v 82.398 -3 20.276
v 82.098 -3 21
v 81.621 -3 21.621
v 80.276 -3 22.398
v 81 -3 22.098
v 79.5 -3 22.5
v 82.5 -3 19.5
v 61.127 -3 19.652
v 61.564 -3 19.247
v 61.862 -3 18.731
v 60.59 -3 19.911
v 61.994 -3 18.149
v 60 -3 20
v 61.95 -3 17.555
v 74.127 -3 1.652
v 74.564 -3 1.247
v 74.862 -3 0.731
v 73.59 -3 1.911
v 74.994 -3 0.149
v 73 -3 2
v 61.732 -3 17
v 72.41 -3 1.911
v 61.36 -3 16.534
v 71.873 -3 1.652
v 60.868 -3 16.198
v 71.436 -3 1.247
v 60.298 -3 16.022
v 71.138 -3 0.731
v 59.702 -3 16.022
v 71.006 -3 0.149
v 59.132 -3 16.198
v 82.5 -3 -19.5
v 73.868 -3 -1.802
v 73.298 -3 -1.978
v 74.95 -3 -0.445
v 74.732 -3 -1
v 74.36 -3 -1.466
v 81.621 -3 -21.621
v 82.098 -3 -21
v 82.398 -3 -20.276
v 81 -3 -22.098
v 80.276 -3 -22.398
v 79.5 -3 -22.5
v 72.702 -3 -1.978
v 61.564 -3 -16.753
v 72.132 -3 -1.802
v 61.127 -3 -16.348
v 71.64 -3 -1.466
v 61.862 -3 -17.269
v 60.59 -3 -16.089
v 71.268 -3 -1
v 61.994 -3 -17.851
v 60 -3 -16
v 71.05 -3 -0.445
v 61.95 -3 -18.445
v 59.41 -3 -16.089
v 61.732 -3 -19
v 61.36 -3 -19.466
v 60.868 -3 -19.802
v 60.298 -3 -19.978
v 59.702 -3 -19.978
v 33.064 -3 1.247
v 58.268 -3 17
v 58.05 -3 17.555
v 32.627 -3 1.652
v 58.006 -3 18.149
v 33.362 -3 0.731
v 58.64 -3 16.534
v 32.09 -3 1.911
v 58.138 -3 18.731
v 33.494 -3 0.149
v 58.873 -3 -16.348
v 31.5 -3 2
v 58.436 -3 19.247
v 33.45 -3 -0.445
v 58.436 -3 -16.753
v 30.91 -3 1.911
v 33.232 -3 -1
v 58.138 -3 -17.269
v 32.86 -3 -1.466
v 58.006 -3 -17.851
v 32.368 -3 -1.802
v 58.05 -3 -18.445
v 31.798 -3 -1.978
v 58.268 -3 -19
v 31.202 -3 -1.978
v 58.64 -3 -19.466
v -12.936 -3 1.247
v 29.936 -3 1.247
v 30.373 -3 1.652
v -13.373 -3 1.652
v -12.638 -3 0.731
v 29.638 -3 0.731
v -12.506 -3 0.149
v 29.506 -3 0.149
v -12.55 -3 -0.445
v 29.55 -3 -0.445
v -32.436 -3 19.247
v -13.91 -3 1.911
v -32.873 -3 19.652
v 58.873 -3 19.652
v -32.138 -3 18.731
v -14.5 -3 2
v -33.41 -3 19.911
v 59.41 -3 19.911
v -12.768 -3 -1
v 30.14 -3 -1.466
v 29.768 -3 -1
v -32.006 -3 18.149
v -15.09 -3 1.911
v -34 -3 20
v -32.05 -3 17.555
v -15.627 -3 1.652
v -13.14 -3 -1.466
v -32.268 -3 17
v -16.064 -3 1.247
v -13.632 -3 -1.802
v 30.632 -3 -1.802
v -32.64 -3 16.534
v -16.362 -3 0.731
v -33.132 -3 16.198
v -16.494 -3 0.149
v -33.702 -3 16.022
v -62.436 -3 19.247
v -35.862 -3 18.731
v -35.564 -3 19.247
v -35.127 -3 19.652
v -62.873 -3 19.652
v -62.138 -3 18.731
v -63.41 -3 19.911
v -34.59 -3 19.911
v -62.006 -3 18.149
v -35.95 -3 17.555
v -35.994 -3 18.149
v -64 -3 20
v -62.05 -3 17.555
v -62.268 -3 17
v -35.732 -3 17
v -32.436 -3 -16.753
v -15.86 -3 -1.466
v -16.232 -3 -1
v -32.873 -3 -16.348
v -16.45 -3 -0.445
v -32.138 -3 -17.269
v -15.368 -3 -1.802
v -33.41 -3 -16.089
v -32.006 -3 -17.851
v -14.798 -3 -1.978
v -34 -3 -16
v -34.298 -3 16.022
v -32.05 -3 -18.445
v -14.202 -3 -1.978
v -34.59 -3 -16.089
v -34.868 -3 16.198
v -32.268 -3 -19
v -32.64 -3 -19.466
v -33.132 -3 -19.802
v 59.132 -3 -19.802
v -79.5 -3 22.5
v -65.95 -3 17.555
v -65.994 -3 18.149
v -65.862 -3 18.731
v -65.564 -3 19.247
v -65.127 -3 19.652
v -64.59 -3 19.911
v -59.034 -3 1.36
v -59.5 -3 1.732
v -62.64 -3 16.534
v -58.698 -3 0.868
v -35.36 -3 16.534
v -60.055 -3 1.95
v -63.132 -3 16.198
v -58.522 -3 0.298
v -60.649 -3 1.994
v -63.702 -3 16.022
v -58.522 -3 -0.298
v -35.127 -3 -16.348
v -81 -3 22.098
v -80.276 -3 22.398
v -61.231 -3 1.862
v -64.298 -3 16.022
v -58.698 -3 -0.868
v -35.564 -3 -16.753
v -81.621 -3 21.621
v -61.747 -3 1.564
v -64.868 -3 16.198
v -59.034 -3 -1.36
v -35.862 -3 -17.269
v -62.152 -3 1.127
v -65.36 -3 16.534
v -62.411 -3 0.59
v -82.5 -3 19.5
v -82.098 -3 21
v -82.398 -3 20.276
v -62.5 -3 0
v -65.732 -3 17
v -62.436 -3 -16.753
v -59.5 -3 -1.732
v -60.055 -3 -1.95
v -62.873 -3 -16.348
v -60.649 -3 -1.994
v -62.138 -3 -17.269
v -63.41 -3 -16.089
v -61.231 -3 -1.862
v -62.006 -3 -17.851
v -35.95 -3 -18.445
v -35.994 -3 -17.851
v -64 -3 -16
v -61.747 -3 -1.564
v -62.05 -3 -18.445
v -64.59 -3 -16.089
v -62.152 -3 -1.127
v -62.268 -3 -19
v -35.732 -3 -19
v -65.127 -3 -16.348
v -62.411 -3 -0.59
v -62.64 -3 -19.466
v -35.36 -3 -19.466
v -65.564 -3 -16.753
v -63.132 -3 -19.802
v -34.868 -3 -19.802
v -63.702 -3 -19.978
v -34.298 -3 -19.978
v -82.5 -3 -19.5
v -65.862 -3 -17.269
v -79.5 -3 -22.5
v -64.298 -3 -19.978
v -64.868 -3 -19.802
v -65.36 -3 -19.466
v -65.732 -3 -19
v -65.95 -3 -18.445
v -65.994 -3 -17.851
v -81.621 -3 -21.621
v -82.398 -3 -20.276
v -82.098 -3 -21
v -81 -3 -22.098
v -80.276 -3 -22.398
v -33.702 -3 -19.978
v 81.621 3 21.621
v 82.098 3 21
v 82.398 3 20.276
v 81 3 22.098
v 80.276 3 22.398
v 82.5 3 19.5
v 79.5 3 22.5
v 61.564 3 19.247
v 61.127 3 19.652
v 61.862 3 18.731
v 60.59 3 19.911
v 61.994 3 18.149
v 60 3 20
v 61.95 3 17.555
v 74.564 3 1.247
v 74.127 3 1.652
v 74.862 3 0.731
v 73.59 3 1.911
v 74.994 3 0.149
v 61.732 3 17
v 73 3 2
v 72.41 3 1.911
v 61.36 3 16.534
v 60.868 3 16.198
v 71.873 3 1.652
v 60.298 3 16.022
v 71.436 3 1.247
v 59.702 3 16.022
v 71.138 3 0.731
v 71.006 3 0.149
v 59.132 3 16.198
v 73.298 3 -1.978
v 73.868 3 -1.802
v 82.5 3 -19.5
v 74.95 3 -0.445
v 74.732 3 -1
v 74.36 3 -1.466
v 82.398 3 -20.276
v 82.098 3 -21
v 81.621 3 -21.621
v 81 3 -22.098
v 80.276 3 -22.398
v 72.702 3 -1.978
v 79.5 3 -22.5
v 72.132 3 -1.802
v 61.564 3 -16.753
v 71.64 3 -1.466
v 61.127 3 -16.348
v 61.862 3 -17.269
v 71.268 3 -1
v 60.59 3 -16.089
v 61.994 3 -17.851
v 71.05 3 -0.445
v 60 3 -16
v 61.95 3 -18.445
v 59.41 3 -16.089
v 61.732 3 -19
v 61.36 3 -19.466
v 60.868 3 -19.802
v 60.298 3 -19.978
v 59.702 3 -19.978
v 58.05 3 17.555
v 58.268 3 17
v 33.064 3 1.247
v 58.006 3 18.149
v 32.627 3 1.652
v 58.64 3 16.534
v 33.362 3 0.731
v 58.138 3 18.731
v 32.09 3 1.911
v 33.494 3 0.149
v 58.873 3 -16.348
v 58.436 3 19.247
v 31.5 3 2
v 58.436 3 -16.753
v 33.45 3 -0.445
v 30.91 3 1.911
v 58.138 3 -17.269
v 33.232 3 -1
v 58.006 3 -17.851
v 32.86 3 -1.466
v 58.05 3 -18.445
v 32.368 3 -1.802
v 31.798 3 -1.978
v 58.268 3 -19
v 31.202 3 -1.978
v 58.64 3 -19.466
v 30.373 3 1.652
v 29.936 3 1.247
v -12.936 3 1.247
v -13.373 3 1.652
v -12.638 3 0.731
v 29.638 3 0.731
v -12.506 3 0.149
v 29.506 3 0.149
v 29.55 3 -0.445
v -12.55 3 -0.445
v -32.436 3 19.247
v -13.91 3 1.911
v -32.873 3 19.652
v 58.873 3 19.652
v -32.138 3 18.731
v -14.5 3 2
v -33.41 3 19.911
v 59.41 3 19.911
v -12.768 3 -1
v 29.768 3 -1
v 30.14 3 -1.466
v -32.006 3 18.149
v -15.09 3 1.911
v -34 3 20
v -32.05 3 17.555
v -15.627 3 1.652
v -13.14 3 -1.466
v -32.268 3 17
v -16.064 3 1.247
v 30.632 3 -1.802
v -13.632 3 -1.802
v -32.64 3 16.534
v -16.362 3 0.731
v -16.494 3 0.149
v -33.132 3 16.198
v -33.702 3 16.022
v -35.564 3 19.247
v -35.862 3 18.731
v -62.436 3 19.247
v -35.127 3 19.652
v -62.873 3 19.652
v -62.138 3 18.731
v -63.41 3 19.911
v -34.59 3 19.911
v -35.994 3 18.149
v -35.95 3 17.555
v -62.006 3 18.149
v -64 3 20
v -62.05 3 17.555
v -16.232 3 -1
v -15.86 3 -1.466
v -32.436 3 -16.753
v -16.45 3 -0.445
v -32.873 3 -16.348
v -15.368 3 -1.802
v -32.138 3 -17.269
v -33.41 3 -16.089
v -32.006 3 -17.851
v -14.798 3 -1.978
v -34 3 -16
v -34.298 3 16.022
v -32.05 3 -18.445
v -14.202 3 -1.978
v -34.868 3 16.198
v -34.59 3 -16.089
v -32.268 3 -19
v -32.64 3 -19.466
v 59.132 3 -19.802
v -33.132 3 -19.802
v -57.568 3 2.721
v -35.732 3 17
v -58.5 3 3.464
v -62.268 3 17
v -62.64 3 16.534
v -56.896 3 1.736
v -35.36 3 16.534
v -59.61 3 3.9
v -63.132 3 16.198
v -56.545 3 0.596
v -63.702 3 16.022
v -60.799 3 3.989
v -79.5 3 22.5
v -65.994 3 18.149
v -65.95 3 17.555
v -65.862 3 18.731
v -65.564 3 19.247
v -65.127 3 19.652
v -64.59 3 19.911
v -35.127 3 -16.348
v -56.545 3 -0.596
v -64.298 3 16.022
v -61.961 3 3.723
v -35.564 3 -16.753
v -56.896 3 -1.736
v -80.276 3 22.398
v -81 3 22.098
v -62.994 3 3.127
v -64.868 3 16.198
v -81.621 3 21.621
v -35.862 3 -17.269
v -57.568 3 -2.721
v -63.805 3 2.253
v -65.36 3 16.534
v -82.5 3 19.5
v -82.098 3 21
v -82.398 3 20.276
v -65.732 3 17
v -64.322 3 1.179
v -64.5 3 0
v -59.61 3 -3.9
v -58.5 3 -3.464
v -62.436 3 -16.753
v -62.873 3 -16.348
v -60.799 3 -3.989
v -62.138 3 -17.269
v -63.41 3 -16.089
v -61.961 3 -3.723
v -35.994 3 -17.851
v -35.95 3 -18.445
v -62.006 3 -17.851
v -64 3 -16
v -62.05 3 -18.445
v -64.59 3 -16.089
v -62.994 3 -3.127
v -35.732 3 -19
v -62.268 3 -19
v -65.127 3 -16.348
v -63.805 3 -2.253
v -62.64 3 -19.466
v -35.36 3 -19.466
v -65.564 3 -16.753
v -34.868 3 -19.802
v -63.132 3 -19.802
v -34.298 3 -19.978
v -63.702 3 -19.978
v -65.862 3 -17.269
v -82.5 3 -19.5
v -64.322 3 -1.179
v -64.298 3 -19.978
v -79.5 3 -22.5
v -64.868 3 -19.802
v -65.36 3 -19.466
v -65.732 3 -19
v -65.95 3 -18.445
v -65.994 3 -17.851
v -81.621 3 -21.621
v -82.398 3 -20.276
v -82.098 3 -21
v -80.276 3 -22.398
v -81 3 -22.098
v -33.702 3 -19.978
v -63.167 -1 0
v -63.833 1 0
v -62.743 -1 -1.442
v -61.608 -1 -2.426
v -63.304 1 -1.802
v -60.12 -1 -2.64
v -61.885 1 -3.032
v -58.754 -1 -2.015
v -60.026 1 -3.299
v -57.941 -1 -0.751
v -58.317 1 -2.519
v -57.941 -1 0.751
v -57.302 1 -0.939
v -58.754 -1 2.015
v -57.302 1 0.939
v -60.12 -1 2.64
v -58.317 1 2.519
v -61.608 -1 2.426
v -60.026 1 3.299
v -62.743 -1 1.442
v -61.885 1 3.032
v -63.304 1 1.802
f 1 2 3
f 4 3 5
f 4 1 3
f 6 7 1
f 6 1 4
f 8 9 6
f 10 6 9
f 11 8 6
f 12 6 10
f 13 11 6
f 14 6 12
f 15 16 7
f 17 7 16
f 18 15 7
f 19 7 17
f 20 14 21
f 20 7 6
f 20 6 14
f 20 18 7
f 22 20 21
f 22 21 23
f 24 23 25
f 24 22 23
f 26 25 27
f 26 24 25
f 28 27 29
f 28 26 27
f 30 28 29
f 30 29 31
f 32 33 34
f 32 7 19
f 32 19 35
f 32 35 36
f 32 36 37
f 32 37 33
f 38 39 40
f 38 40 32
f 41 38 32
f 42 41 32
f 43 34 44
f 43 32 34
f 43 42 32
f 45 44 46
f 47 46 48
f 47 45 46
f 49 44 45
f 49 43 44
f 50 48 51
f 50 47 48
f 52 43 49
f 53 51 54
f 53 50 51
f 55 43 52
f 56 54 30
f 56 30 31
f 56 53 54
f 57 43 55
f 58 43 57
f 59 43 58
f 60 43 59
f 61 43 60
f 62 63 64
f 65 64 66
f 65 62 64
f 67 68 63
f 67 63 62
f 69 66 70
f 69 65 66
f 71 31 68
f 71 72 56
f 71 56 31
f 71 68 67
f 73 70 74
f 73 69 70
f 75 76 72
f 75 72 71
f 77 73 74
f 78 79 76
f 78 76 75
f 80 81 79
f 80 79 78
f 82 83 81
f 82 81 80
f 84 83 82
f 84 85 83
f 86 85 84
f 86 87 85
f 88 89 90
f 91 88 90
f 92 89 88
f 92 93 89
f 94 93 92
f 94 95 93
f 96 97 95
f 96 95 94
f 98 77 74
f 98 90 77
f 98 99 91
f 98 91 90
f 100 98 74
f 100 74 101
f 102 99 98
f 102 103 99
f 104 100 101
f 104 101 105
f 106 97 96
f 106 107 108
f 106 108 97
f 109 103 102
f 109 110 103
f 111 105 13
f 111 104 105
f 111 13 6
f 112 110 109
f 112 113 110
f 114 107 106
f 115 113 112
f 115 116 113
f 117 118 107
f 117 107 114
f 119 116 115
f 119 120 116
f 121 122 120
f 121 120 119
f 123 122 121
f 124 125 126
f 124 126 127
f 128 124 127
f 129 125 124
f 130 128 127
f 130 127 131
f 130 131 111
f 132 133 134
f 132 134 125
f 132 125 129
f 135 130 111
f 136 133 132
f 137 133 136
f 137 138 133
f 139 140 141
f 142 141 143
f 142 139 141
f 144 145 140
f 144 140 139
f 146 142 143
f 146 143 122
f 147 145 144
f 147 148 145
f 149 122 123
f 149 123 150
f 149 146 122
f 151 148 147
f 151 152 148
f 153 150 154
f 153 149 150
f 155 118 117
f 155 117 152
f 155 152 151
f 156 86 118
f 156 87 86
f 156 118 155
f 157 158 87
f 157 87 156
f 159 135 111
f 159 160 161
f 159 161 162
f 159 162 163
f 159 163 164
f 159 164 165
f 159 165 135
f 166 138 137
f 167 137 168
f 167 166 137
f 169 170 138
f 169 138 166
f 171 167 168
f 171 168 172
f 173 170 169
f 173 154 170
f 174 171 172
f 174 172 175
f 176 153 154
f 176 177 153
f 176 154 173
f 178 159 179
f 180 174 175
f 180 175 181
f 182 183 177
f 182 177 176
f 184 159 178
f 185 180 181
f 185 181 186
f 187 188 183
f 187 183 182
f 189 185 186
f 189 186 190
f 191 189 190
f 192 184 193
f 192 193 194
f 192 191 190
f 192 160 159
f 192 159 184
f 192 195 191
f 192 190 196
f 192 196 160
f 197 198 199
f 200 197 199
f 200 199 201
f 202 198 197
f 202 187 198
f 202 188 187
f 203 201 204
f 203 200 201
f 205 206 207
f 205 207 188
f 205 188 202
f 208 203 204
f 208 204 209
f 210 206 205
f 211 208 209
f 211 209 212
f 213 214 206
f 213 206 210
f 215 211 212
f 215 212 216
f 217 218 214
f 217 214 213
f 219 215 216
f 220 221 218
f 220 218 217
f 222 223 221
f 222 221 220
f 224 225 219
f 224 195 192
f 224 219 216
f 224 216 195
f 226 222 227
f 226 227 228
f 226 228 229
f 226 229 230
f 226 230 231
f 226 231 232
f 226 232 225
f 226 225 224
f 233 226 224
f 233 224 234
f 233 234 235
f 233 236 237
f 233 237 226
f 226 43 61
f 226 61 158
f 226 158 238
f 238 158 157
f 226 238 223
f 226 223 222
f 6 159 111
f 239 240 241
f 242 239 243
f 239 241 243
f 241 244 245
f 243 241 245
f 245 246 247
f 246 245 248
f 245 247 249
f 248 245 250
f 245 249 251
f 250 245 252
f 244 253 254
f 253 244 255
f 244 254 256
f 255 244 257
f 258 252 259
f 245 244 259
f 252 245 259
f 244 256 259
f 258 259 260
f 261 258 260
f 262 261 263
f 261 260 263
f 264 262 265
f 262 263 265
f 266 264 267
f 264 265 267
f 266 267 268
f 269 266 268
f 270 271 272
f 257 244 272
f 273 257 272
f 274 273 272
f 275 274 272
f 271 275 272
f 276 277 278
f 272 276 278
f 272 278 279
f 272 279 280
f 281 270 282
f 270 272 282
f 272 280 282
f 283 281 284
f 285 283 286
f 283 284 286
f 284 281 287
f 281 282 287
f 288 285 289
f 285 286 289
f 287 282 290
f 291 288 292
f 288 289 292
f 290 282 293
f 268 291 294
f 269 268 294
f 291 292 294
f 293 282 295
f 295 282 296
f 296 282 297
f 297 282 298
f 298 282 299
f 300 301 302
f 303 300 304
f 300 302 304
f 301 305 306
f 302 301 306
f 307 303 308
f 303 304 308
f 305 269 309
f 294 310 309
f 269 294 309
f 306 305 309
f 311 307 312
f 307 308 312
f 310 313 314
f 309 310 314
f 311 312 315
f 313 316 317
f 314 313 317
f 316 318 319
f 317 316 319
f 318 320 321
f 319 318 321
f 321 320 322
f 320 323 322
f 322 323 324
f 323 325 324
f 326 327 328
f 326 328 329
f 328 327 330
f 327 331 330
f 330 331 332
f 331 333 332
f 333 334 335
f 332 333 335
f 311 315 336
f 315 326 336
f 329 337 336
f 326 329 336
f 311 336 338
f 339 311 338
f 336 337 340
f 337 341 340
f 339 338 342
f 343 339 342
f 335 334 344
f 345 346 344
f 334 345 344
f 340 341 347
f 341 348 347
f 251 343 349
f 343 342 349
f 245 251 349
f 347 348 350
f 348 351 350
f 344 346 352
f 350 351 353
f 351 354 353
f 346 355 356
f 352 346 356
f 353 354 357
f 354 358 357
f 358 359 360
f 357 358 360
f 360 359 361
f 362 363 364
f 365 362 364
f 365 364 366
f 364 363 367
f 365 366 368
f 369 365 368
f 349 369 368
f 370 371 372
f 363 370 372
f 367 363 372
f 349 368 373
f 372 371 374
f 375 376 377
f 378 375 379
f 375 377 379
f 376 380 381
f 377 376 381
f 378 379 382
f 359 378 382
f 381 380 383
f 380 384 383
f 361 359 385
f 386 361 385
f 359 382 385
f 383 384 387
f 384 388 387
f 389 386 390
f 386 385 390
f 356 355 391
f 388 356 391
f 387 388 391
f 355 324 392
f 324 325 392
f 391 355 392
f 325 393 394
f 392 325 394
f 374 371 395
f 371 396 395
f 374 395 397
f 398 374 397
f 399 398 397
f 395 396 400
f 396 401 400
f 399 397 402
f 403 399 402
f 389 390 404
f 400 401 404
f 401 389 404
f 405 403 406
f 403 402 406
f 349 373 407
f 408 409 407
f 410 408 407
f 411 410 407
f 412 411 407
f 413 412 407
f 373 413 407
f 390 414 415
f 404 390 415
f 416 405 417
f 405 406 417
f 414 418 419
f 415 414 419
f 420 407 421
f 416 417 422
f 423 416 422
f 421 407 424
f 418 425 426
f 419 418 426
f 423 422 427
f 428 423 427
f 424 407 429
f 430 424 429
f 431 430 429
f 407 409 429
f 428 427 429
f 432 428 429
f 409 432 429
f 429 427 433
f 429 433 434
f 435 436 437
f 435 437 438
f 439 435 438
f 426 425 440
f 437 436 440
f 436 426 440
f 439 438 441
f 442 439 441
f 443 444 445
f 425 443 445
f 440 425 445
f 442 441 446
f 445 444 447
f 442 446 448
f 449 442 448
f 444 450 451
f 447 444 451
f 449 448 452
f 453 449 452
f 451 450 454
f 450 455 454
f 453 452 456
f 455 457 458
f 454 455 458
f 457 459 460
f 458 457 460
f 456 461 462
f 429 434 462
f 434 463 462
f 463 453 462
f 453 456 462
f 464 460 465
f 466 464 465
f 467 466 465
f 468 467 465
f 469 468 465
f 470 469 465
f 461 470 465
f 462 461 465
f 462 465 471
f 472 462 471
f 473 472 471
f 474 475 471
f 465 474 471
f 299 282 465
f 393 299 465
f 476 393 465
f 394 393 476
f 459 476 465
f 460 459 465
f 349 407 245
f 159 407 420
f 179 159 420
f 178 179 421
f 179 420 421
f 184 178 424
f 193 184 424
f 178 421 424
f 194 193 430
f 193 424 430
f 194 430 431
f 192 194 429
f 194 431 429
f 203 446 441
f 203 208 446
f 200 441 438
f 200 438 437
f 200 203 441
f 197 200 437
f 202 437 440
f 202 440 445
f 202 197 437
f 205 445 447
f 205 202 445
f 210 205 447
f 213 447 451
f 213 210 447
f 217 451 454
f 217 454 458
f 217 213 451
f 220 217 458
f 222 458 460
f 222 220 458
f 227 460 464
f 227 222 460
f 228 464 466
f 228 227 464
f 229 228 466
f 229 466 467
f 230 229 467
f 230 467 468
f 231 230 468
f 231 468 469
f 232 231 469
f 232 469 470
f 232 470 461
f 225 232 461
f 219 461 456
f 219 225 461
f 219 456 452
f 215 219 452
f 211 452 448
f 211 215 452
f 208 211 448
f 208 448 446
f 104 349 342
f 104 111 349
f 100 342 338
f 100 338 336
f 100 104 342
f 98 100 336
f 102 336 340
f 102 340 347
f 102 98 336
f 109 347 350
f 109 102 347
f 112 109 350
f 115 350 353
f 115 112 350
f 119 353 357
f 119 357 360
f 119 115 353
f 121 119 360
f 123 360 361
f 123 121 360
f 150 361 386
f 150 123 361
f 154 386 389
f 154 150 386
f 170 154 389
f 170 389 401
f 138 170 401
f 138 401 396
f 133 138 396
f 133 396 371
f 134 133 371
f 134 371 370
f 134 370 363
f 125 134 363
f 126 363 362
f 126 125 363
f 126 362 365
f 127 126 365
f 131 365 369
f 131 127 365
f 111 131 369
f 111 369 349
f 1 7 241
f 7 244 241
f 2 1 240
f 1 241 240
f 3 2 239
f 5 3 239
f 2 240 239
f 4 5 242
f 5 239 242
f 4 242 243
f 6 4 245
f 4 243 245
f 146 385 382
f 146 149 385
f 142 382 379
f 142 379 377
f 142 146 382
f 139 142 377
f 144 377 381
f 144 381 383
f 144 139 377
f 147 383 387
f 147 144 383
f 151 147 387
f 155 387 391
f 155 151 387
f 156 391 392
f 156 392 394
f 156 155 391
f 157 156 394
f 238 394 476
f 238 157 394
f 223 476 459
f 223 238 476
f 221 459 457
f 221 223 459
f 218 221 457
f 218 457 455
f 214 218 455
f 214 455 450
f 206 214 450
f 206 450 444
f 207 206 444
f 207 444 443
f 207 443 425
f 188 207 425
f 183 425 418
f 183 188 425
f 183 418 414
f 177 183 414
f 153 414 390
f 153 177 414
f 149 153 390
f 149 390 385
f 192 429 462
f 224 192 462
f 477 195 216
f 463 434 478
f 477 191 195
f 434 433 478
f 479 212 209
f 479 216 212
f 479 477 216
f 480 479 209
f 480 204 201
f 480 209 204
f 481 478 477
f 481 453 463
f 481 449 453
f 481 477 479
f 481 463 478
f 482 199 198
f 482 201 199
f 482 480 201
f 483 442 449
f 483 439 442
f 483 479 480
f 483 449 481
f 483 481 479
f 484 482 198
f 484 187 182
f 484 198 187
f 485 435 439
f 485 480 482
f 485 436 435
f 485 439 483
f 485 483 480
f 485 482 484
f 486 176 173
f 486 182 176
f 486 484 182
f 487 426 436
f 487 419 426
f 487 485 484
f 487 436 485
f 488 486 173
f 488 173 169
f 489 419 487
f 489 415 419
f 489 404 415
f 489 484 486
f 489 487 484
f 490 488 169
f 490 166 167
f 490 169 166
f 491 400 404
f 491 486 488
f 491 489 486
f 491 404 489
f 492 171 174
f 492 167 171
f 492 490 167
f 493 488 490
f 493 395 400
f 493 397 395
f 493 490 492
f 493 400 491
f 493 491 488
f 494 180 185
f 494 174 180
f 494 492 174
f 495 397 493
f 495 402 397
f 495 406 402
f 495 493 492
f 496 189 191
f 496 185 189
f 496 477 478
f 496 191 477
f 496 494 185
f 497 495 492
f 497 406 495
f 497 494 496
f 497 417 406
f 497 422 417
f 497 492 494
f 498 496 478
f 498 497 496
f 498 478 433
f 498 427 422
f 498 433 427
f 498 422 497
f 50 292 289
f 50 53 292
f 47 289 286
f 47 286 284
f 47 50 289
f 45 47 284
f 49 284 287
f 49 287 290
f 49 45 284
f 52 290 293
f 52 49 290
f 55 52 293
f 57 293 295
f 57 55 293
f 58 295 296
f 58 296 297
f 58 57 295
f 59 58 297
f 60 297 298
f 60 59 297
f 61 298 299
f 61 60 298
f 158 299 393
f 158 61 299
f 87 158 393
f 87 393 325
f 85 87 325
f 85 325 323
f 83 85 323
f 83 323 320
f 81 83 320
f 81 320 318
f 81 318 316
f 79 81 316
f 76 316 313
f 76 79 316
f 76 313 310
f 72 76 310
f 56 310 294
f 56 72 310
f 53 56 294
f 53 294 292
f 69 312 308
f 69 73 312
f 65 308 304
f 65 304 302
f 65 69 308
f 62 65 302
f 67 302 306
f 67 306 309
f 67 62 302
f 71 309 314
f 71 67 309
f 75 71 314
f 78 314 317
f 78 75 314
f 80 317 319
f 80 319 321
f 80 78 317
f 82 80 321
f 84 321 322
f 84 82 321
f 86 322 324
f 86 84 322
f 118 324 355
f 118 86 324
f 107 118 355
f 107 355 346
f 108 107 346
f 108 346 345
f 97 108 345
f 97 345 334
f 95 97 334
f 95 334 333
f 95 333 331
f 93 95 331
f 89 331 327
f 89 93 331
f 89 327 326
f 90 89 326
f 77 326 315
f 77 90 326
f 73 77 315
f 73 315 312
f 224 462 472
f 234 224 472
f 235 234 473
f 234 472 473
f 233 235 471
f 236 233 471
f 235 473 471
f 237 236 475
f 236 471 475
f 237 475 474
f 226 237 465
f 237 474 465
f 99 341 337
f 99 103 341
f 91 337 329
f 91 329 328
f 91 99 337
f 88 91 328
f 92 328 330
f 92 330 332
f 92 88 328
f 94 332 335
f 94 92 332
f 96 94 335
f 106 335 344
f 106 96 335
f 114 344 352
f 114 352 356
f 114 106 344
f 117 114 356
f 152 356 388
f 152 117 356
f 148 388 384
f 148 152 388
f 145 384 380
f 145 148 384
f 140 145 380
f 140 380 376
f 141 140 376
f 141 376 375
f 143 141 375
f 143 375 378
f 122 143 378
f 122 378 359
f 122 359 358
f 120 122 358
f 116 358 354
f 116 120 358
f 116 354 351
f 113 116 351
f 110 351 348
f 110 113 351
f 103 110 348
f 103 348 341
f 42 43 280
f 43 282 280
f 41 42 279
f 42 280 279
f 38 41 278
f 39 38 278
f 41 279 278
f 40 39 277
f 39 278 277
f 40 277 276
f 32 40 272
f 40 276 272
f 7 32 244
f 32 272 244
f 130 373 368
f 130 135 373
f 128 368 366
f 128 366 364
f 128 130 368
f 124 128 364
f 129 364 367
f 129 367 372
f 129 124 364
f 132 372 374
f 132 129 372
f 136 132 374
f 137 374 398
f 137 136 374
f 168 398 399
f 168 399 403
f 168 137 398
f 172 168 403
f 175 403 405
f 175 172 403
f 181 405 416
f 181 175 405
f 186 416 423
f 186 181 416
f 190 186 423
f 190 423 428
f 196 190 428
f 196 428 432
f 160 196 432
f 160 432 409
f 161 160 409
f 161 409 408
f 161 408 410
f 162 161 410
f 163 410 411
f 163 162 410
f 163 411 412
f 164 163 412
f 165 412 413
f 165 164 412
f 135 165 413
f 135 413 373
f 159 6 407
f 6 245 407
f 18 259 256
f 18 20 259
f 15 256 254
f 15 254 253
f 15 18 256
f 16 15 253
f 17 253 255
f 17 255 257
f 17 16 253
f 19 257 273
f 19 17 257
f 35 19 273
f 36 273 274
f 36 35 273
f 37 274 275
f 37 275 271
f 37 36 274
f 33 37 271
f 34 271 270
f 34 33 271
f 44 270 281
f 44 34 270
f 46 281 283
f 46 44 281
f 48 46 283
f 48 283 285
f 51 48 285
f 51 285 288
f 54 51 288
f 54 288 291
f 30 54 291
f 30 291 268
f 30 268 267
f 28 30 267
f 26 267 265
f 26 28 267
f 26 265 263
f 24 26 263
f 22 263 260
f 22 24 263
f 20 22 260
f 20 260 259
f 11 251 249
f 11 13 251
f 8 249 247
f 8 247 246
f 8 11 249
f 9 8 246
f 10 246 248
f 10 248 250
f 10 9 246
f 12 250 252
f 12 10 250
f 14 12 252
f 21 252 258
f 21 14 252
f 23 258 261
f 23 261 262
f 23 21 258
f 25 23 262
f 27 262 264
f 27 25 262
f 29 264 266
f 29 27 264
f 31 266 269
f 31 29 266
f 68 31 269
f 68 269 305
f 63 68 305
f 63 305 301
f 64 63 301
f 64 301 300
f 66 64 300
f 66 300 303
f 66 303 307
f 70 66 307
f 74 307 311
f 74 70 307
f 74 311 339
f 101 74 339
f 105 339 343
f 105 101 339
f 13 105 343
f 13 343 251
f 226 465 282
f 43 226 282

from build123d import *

# Parameters (mm, degrees)
SKETCH1_R           = 2
BOSS_EXTRUDE1_DEPTH = 3


with BuildPart() as part:
    # Sketch1 → Boss-Extrude1 (new, symmetric)
    with BuildSketch(Plane(origin=(0, 0, 0), x_dir=(1, 0, 0), z_dir=(0, 1, 0))):
        with BuildLine():
            Line((-79.5, 22.5), (79.5, 22.5))
            ThreePointArc((79.5, 22.5), (81.621320344, 21.621320344), (82.5, 19.5))
            Line((82.5, 19.5), (82.5, -19.5))
            ThreePointArc((82.5, -19.5), (81.621320344, -21.621320344), (79.5, -22.5))
            Line((79.5, -22.5), (-79.5, -22.5))
            ThreePointArc((-79.5, -22.5), (-81.621320344, -21.621320344), (-82.5, -19.5))
            Line((-82.5, -19.5), (-82.5, 19.5))
            ThreePointArc((-82.5, 19.5), (-81.621320344, 21.621320344), (-79.5, 22.5))
        make_face()
        with Locations(Location((-64, 18, 0), (0, 0, 270))):
            Circle(SKETCH1_R, mode=Mode.SUBTRACT)
        with Locations(Location((-34, 18, 0), (0, 0, 270))):
            Circle(SKETCH1_R, mode=Mode.SUBTRACT)
        with Locations(Location((60, 18, 0), (0, 0, 270))):
            Circle(SKETCH1_R, mode=Mode.SUBTRACT)
        with Locations(Location((-60.5, 0, 0), (0, 0, 270))):
            Circle(SKETCH1_R, mode=Mode.SUBTRACT)
        with Locations(Location((-14.5, 0, 0), (0, 0, 270))):
            Circle(SKETCH1_R, mode=Mode.SUBTRACT)
        with Locations(Location((31.5, 0, 0), (0, 0, 270))):
            Circle(SKETCH1_R, mode=Mode.SUBTRACT)
        with Locations(Location((73, 0, 0), (0, 0, 270))):
            Circle(SKETCH1_R, mode=Mode.SUBTRACT)
        with Locations(Location((60, -18, 0), (0, 0, 270))):
            Circle(SKETCH1_R, mode=Mode.SUBTRACT)
        with Locations(Location((-34, -18, 0), (0, 0, 270))):
            Circle(SKETCH1_R, mode=Mode.SUBTRACT)
        with Locations(Location((-64, -18, 0), (0, 0, 270))):
            Circle(SKETCH1_R, mode=Mode.SUBTRACT)
    extrude(amount=BOSS_EXTRUDE1_DEPTH, both=True)

    # Sketch7 → Cut-Revolve1 (revolve, cut)
    with BuildSketch(Plane.XY, mode=Mode.PRIVATE) as cut_revolve1_sk:
        Polygon((-58.5, -3), (-56.5, 3), (-58.5, 3), align=None)
    revolve(cut_revolve1_sk.sketch.rotate(Axis((-60.5, 0, 0), (0, -1, 0)), 180), axis=Axis((-60.5, 0, 0), (0, -1, 0)), mode=Mode.SUBTRACT)


solid = part.part
